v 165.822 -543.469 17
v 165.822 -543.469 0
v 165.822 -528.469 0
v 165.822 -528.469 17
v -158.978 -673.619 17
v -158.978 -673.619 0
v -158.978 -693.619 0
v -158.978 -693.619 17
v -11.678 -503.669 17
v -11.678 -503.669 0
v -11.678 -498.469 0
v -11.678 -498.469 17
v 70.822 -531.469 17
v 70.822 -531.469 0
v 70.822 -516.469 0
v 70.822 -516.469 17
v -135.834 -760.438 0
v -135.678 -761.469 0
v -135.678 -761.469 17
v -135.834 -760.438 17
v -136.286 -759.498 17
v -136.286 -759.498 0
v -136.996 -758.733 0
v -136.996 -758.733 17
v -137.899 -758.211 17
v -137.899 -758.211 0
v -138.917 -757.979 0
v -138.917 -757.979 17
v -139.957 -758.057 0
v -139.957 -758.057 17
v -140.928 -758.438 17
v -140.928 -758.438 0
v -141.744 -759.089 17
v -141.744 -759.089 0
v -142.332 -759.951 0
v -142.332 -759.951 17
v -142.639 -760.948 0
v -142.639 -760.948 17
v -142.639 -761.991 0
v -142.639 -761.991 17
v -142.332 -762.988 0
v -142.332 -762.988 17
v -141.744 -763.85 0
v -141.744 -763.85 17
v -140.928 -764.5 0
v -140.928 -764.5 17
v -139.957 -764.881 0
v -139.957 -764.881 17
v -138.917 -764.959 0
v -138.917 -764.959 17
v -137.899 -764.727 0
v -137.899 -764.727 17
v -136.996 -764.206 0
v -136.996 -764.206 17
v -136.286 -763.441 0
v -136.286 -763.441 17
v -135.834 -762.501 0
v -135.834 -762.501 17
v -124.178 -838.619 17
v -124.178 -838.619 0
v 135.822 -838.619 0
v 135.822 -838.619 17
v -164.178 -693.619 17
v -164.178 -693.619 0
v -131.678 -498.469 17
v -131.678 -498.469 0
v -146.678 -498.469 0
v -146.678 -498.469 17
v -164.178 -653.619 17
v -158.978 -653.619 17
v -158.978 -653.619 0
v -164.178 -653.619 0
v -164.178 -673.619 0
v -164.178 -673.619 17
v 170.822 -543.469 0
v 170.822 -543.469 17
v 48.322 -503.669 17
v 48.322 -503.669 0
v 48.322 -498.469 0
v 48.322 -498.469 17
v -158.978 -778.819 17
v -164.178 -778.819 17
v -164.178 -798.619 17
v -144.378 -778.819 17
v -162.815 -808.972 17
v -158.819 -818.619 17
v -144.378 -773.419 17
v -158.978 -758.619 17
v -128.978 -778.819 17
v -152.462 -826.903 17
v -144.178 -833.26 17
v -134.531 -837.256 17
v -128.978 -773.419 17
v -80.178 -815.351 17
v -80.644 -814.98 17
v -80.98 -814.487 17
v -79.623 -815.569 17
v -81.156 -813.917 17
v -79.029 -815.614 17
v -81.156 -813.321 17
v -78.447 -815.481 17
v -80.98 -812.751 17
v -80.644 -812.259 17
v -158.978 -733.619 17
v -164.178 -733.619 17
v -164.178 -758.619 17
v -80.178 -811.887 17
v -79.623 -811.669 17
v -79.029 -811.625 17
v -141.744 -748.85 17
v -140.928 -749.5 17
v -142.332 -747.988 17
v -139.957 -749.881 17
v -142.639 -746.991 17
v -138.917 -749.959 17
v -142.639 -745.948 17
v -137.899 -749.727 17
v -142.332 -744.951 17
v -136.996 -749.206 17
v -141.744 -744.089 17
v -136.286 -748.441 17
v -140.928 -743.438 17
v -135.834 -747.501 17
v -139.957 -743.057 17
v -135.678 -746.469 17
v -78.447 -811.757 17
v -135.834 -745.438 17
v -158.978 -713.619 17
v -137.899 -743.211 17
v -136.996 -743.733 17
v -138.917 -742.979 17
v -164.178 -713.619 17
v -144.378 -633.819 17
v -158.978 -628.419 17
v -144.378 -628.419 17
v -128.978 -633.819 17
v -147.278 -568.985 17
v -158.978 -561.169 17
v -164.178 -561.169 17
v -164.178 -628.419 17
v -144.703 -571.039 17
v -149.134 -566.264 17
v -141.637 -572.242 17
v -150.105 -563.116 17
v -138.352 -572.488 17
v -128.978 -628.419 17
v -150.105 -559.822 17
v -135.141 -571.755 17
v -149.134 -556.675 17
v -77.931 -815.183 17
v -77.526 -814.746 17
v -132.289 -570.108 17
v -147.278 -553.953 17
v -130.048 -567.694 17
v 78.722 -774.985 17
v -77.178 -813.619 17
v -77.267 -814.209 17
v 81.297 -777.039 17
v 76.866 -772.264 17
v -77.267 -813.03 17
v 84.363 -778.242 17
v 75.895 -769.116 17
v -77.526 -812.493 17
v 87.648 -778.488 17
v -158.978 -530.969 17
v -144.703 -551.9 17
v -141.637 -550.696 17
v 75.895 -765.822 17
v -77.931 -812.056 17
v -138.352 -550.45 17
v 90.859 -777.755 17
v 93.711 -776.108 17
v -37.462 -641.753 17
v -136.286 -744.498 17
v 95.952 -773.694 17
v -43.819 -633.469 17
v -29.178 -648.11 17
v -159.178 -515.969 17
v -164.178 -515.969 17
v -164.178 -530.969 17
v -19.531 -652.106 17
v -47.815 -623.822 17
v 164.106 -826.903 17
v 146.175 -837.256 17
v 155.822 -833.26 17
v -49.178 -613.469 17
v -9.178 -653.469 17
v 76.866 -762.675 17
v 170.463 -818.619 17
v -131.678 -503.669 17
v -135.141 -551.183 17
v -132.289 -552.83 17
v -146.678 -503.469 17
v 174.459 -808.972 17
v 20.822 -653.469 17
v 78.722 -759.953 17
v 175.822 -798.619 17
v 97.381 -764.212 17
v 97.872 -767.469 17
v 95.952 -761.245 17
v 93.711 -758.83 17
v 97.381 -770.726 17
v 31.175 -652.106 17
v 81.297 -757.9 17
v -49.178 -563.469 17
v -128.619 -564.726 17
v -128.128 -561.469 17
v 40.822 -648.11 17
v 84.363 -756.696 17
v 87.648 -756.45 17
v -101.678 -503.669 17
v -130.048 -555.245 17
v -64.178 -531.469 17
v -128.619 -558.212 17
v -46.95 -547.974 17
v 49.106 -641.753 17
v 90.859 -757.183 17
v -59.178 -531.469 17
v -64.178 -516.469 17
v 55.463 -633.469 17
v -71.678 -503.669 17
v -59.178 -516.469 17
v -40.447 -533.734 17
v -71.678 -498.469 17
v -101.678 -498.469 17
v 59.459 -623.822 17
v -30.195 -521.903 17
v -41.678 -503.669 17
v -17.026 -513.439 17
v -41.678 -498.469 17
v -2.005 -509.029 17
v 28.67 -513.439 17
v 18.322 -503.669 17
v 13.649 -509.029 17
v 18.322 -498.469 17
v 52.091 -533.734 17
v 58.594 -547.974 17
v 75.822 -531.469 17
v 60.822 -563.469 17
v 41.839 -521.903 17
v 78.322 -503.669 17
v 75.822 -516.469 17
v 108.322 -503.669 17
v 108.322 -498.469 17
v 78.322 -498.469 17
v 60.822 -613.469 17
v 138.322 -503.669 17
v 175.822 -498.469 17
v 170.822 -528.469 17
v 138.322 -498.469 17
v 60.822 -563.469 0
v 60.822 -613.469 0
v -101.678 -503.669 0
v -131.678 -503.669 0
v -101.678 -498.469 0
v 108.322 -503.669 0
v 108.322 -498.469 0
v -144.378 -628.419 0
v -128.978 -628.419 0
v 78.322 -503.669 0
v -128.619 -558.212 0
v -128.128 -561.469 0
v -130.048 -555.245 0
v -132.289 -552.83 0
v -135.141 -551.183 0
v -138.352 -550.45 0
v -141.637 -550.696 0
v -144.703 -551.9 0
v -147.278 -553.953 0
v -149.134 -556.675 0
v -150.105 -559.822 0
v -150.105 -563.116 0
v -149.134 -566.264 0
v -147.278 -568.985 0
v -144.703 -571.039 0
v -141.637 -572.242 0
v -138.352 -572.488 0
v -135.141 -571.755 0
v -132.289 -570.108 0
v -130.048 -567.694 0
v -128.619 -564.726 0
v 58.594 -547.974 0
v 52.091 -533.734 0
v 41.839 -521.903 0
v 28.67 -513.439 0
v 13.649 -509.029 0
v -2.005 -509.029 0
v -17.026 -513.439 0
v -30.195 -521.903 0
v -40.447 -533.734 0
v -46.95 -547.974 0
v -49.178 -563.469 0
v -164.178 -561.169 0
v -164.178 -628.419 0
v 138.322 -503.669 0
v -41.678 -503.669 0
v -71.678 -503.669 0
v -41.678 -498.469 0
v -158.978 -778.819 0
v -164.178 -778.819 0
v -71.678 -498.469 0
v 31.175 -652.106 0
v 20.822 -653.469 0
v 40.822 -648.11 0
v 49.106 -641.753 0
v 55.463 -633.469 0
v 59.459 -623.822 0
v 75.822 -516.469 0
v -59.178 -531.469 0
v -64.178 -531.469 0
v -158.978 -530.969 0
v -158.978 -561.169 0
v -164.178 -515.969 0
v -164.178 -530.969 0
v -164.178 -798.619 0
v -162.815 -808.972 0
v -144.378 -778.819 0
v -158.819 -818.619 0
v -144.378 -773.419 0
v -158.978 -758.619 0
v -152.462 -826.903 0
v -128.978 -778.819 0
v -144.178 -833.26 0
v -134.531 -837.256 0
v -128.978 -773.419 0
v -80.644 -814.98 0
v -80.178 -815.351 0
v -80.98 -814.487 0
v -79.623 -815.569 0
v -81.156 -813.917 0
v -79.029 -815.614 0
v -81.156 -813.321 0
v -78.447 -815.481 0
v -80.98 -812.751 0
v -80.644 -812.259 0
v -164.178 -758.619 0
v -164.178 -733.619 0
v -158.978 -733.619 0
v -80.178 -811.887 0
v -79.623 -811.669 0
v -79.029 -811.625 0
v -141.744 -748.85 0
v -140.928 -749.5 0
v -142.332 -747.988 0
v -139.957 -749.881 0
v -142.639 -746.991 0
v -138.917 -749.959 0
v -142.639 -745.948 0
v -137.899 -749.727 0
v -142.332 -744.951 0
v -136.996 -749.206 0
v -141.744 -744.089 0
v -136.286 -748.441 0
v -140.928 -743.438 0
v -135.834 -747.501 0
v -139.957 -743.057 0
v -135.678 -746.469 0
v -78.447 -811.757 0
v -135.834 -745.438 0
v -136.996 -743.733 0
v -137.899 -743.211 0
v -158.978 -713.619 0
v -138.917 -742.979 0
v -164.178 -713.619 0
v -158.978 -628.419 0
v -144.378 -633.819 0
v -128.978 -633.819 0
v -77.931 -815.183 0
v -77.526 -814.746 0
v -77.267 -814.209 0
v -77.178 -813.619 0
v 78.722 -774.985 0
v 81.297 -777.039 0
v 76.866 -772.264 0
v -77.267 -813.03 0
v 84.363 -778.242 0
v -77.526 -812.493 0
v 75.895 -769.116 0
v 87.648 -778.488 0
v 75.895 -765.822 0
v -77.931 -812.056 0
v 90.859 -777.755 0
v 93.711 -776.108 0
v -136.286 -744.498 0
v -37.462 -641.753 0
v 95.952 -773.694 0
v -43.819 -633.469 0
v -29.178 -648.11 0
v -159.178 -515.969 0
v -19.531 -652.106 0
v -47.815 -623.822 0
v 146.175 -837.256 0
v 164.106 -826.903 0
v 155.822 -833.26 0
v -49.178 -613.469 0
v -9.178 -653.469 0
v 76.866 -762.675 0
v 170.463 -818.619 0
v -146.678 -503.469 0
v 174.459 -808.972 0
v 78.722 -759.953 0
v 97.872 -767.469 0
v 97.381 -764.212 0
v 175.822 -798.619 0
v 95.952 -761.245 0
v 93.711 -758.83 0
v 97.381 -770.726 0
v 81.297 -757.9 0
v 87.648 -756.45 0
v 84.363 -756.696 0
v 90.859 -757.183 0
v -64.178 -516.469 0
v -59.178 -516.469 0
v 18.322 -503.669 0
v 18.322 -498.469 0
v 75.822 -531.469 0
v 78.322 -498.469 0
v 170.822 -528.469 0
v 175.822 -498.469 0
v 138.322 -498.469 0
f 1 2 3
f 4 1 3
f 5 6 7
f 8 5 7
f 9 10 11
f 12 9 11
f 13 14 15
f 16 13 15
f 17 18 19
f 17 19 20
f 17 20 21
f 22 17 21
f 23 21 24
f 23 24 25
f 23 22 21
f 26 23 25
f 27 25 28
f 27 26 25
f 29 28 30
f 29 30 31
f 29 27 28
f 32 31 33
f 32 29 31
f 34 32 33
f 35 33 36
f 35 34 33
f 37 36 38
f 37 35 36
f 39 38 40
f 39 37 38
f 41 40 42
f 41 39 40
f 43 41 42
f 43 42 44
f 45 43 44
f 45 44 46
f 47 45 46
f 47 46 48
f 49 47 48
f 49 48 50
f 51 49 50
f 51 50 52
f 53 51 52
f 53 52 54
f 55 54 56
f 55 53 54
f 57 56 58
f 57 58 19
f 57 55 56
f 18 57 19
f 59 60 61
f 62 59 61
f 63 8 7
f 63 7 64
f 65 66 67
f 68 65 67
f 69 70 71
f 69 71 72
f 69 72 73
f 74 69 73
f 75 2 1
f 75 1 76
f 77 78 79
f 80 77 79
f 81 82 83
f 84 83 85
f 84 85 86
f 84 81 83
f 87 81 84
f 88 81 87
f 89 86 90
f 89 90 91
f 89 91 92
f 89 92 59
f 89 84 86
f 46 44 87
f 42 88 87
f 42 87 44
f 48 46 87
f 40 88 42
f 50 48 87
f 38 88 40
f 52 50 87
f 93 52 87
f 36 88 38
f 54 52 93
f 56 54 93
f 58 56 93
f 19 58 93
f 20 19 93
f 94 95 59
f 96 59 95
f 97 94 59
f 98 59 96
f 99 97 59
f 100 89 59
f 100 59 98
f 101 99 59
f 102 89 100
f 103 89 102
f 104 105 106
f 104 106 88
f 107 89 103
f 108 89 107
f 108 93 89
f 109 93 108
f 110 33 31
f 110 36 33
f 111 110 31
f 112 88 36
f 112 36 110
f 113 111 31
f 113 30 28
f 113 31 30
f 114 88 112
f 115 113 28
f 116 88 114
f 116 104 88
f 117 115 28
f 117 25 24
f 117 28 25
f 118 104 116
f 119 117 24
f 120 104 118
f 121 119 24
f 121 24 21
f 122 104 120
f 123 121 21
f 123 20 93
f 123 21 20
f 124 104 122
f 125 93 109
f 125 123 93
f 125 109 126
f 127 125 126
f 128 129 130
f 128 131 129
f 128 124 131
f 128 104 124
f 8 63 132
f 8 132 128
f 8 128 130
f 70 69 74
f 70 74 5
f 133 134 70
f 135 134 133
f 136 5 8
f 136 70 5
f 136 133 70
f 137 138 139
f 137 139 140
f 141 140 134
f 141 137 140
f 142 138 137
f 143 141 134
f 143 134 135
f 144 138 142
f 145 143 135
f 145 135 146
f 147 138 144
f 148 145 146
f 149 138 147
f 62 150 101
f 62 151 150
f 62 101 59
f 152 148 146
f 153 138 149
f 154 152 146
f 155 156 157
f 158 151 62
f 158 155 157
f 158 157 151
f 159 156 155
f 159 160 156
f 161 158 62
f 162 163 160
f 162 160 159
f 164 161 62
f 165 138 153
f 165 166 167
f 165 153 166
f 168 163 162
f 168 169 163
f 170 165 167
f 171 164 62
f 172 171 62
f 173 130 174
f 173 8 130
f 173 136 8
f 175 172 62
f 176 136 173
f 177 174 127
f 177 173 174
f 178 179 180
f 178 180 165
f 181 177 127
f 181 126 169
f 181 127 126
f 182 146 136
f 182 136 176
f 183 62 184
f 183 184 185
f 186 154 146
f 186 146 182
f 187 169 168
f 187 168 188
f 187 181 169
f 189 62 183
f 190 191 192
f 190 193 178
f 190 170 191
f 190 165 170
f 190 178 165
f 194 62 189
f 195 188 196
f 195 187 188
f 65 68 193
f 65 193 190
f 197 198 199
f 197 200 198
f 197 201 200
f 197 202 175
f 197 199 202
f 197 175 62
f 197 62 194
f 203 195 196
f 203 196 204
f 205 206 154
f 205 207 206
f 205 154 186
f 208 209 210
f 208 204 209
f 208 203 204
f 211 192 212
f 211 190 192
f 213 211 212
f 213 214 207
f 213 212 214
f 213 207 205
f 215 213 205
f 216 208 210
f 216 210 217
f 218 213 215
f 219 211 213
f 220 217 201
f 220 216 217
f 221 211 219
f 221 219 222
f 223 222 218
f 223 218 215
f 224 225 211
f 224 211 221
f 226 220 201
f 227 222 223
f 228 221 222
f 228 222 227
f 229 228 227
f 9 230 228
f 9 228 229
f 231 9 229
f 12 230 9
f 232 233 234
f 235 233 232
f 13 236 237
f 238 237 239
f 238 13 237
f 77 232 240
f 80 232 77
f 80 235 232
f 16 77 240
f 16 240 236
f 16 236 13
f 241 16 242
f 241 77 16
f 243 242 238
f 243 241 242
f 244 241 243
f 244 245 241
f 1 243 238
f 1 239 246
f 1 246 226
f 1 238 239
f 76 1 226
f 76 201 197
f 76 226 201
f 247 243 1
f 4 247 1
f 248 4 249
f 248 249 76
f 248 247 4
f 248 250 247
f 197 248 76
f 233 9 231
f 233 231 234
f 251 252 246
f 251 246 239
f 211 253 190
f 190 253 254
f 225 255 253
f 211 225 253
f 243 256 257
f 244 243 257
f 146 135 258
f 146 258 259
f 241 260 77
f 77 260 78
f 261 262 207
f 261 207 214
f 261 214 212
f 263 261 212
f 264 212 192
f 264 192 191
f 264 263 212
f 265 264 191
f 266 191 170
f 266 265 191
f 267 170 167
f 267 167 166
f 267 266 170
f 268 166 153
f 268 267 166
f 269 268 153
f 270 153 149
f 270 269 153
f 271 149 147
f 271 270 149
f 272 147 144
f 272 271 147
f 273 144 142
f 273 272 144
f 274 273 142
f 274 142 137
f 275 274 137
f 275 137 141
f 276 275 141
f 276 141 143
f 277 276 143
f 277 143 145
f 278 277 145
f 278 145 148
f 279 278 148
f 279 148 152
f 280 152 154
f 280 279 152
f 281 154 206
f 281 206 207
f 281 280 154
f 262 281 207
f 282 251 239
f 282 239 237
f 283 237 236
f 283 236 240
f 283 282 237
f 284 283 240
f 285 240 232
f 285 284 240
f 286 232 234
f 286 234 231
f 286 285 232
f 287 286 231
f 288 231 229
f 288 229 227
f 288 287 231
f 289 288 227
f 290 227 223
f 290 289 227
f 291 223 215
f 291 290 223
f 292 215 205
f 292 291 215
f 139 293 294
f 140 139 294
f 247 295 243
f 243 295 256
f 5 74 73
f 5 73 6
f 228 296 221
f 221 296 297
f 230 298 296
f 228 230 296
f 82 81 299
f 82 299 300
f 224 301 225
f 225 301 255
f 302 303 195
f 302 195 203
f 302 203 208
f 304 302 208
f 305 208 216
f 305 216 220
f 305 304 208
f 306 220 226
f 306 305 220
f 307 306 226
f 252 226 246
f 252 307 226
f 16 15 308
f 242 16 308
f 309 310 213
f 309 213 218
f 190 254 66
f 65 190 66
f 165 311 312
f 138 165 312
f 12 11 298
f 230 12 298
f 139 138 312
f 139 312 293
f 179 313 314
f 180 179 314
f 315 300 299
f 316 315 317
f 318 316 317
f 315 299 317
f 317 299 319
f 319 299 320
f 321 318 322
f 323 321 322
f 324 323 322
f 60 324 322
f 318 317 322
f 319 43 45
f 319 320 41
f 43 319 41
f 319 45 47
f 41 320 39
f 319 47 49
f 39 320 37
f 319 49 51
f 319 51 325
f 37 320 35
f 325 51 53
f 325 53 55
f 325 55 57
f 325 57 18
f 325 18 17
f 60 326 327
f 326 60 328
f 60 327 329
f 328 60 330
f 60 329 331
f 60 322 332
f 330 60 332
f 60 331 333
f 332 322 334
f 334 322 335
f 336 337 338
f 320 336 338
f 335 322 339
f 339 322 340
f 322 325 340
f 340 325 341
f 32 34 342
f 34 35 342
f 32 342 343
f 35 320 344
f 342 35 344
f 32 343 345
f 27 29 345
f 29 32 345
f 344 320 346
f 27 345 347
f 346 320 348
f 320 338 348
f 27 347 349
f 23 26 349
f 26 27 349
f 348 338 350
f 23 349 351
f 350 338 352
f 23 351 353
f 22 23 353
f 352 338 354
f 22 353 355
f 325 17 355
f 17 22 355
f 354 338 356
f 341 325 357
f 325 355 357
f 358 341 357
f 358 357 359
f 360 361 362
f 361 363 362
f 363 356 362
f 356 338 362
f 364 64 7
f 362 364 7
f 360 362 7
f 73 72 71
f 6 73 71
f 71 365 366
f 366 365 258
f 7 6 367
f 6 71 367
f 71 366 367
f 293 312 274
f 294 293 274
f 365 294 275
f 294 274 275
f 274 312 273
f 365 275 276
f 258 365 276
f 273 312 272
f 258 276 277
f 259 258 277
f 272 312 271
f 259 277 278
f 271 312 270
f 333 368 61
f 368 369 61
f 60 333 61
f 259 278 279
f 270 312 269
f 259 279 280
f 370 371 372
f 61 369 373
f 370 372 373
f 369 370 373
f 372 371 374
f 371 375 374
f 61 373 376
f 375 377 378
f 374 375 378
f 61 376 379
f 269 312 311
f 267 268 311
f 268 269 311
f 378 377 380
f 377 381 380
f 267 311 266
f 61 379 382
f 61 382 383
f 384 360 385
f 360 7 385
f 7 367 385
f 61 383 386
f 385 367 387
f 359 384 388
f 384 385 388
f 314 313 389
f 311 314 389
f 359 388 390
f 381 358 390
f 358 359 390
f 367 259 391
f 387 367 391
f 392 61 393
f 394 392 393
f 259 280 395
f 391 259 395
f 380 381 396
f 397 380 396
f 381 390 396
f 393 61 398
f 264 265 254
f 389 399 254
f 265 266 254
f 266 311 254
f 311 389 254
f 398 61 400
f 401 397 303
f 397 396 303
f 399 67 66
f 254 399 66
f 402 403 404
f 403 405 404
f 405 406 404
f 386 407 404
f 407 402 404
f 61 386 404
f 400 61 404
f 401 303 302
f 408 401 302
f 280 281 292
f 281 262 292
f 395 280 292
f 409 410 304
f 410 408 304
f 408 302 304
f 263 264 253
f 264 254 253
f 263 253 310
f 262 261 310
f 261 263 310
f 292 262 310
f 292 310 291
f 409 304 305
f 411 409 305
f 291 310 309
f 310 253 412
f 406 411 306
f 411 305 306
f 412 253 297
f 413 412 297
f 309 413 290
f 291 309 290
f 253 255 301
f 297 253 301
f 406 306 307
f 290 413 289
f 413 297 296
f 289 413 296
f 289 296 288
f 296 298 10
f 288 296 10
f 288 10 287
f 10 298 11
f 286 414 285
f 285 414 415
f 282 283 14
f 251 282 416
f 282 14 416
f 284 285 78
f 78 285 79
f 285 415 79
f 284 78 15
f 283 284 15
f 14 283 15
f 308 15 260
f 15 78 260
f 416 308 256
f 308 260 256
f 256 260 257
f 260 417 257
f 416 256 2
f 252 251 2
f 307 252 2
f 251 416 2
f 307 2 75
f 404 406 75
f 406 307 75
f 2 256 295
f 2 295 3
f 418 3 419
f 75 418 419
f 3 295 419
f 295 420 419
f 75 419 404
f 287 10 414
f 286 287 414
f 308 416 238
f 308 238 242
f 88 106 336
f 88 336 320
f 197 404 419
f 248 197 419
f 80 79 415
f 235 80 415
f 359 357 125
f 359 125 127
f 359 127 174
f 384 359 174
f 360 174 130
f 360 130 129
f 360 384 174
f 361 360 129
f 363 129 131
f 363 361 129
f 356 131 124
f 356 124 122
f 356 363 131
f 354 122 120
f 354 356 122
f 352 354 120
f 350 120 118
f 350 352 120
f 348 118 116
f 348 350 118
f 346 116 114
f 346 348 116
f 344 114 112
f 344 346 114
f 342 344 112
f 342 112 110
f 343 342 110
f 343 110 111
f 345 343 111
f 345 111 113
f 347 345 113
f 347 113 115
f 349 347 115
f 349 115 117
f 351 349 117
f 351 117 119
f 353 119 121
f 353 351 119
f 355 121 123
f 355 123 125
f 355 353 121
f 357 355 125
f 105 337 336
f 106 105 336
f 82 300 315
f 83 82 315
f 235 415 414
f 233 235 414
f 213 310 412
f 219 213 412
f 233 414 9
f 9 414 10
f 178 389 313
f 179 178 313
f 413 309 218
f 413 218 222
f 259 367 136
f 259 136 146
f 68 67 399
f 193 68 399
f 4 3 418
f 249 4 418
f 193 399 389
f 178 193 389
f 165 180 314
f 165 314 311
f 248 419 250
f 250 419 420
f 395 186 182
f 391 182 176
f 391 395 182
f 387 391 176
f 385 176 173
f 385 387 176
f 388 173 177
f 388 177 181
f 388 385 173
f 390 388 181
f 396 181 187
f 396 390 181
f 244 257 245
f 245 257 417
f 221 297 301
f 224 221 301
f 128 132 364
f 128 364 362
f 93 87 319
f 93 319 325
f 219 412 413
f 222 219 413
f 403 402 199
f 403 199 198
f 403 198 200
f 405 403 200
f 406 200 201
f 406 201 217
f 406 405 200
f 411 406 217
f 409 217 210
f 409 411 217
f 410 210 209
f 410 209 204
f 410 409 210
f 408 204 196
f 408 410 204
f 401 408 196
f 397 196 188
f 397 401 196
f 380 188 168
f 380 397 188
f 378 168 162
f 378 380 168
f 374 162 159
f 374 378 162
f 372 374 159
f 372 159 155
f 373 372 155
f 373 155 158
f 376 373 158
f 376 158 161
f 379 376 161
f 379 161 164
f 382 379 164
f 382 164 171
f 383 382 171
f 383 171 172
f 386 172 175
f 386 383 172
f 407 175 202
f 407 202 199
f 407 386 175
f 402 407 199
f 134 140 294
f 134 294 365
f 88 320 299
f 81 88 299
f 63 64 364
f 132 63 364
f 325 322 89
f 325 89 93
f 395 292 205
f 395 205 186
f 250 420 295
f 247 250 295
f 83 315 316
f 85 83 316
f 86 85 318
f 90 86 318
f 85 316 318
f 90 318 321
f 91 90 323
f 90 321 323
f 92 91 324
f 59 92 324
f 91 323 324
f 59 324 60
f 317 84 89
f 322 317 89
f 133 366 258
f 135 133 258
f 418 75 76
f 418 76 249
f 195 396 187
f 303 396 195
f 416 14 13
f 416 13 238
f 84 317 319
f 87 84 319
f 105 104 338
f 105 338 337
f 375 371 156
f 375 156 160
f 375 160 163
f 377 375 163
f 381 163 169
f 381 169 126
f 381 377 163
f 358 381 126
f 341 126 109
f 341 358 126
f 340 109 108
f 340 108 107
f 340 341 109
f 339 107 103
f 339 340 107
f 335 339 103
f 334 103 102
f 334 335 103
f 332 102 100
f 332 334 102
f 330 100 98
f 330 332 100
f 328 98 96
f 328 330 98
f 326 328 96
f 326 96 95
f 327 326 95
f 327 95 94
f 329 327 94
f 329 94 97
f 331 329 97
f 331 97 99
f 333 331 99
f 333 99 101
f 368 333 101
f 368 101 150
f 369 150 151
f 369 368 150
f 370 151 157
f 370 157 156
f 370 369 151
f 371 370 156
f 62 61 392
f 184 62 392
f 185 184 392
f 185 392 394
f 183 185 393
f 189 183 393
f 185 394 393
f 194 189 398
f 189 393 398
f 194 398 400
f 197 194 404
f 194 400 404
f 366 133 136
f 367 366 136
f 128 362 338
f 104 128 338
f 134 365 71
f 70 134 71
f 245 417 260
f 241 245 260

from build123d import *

# Parameters (mm, degrees)
MODEL_R             = 11.05
MODEL_R_2           = 2
MODEL_R_3           = 3.5
MODEL_W             = 15.4
MODEL_H             = 5.4
MODEL_W_2           = 5
MODEL_H_2           = 15
BOSS_EXTRUDE1_DEPTH = 17


with BuildPart() as part:
    # Model → Boss-Extrude1 (new body)
    with BuildSketch(Plane.XY):
        with BuildLine():
            Line((-158.978150708, -561.169218198), (-164.178150708, -561.169218198))
            Line((-164.178150708, -561.169218198), (-164.178150708, -628.419218198))
            Line((-164.178150708, -628.419218198), (-158.978150708, -628.419218198))
            Line((-158.978150708, -628.419218198), (-158.978150708, -653.619218198))
            Line((-158.978150708, -653.619218198), (-164.178150708, -653.619218198))
            Line((-164.178150708, -653.619218198), (-164.178150708, -673.619218198))
            Line((-164.178150708, -673.619218198), (-158.978150708, -673.619218198))
            Line((-158.978150708, -673.619218198), (-158.978150708, -693.619218198))
            Line((-158.978150708, -693.619218198), (-164.178150708, -693.619218198))
            Line((-164.178150708, -693.619218198), (-164.178150708, -713.619218198))
            Line((-164.178150708, -713.619218198), (-158.978150708, -713.619218198))
            Line((-158.978150708, -713.619218198), (-158.978150708, -733.619218198))
            Line((-158.978150708, -733.619218198), (-164.178150708, -733.619218198))
            Line((-164.178150708, -733.619218198), (-164.178150708, -758.619218198))
            Line((-164.178150708, -758.619218198), (-158.978150708, -758.619218198))
            Line((-158.978150708, -758.619218198), (-158.978150708, -778.819218198))
            Line((-158.978150708, -778.819218198), (-164.178150708, -778.819218198))
            Line((-164.178150708, -778.819218198), (-164.178150708, -798.619218198))
            ThreePointArc((-164.178150708, -798.619218198), (-152.462421956, -826.903489445), (-124.178150708, -838.619218198))
            Line((-124.178150708, -838.619218198), (135.821849292, -838.619218198))
            ThreePointArc((135.821849292, -838.619218198), (164.106120539, -826.903489445), (175.821849292, -798.619218198))
            Line((175.821849292, -798.619218198), (175.821849292, -498.469218198))
            Line((175.821849292, -498.469218198), (138.321849292, -498.469218198))
            Line((138.321849292, -498.469218198), (138.321849292, -503.669218198))
            Line((138.321849292, -503.669218198), (108.321849292, -503.669218198))
            Line((108.321849292, -503.669218198), (108.321849292, -498.469218198))
            Line((108.321849292, -498.469218198), (78.321849292, -498.469218198))
            Line((78.321849292, -498.469218198), (78.321849292, -503.669218198))
            Line((78.321849292, -503.669218198), (48.321849292, -503.669218198))
            Line((48.321849292, -503.669218198), (48.321849292, -498.469218198))
            Line((48.321849292, -498.469218198), (18.321849292, -498.469218198))
            Line((18.321849292, -498.469218198), (18.321849292, -503.669218198))
            Line((18.321849292, -503.669218198), (-11.678150708, -503.669218198))
            Line((-11.678150708, -503.669218198), (-11.678150708, -498.469218198))
            Line((-11.678150708, -498.469218198), (-41.678150708, -498.469218198))
            Line((-41.678150708, -498.469218198), (-41.678150708, -503.669218198))
            Line((-41.678150708, -503.669218198), (-71.678150708, -503.669218198))
            Line((-71.678150708, -503.669218198), (-71.678150708, -498.469218198))
            Line((-71.678150708, -498.469218198), (-101.678150708, -498.469218198))
            Line((-101.678150708, -498.469218198), (-101.678150708, -503.669218198))
            Line((-101.678150708, -503.669218198), (-131.678150708, -503.669218198))
            Line((-131.678150708, -503.669218198), (-131.678150708, -498.469218198))
            Line((-131.678150708, -498.469218198), (-146.678150708, -498.469218198))
            Line((-146.678150708, -498.469218198), (-146.678150708, -503.469218198))
            Line((-146.678150708, -503.469218198), (-159.178150708, -515.969218198))
            Line((-159.178150708, -515.969218198), (-164.178150708, -515.969218198))
            Line((-164.178150708, -515.969218198), (-164.178150708, -530.969218198))
            Line((-164.178150708, -530.969218198), (-158.978150708, -530.969218198))
            Line((-158.978150708, -530.969218198), (-158.978150708, -561.169218198))
        make_face()
        with Locations((86.821849292, -767.469218198)):
            Circle(MODEL_R, mode=Mode.SUBTRACT)
        with Locations((-139.178150708, -561.469218198)):
            Circle(MODEL_R, mode=Mode.SUBTRACT)
        with Locations((-79.178150708, -813.619218198)):
            Circle(MODEL_R_2, mode=Mode.SUBTRACT)
        with Locations((-139.178150708, -746.469218198)):
            Circle(MODEL_R_3, mode=Mode.SUBTRACT)
        with Locations((-139.178150708, -761.469218198)):
            Circle(MODEL_R_3, mode=Mode.SUBTRACT)
        with BuildLine():
            Line((60.821849292, -613.469218198), (60.821849292, -563.469218198))
            ThreePointArc((60.821849292, -563.469218198), (5.821849292, -508.469218198), (-49.178150708, -563.469218198))
            Line((-49.178150708, -563.469218198), (-49.178150708, -613.469218198))
            ThreePointArc((-49.178150708, -613.469218198), (-37.462421956, -641.753489445), (-9.178150708, -653.469218198))
            Line((-9.178150708, -653.469218198), (20.821849292, -653.469218198))
            ThreePointArc((20.821849292, -653.469218198), (49.106120539, -641.753489445), (60.821849292, -613.469218198))
        make_face(mode=Mode.SUBTRACT)
        with Locations((-136.678150708, -631.119218198)):
            Rectangle(MODEL_W, MODEL_H, mode=Mode.SUBTRACT)
        with Locations((-136.678150708, -776.119218198)):
            Rectangle(MODEL_W, MODEL_H, mode=Mode.SUBTRACT)
        with Locations((73.321849292, -523.969218198)):
            Rectangle(MODEL_W_2, MODEL_H_2, mode=Mode.SUBTRACT)
        with Locations((168.321849292, -535.969218198)):
            Rectangle(MODEL_W_2, MODEL_H_2, mode=Mode.SUBTRACT)
        with Locations((-61.678150708, -523.969218198)):
            Rectangle(MODEL_W_2, MODEL_H_2, mode=Mode.SUBTRACT)
    extrude(amount=BOSS_EXTRUDE1_DEPTH)


solid = part.part
